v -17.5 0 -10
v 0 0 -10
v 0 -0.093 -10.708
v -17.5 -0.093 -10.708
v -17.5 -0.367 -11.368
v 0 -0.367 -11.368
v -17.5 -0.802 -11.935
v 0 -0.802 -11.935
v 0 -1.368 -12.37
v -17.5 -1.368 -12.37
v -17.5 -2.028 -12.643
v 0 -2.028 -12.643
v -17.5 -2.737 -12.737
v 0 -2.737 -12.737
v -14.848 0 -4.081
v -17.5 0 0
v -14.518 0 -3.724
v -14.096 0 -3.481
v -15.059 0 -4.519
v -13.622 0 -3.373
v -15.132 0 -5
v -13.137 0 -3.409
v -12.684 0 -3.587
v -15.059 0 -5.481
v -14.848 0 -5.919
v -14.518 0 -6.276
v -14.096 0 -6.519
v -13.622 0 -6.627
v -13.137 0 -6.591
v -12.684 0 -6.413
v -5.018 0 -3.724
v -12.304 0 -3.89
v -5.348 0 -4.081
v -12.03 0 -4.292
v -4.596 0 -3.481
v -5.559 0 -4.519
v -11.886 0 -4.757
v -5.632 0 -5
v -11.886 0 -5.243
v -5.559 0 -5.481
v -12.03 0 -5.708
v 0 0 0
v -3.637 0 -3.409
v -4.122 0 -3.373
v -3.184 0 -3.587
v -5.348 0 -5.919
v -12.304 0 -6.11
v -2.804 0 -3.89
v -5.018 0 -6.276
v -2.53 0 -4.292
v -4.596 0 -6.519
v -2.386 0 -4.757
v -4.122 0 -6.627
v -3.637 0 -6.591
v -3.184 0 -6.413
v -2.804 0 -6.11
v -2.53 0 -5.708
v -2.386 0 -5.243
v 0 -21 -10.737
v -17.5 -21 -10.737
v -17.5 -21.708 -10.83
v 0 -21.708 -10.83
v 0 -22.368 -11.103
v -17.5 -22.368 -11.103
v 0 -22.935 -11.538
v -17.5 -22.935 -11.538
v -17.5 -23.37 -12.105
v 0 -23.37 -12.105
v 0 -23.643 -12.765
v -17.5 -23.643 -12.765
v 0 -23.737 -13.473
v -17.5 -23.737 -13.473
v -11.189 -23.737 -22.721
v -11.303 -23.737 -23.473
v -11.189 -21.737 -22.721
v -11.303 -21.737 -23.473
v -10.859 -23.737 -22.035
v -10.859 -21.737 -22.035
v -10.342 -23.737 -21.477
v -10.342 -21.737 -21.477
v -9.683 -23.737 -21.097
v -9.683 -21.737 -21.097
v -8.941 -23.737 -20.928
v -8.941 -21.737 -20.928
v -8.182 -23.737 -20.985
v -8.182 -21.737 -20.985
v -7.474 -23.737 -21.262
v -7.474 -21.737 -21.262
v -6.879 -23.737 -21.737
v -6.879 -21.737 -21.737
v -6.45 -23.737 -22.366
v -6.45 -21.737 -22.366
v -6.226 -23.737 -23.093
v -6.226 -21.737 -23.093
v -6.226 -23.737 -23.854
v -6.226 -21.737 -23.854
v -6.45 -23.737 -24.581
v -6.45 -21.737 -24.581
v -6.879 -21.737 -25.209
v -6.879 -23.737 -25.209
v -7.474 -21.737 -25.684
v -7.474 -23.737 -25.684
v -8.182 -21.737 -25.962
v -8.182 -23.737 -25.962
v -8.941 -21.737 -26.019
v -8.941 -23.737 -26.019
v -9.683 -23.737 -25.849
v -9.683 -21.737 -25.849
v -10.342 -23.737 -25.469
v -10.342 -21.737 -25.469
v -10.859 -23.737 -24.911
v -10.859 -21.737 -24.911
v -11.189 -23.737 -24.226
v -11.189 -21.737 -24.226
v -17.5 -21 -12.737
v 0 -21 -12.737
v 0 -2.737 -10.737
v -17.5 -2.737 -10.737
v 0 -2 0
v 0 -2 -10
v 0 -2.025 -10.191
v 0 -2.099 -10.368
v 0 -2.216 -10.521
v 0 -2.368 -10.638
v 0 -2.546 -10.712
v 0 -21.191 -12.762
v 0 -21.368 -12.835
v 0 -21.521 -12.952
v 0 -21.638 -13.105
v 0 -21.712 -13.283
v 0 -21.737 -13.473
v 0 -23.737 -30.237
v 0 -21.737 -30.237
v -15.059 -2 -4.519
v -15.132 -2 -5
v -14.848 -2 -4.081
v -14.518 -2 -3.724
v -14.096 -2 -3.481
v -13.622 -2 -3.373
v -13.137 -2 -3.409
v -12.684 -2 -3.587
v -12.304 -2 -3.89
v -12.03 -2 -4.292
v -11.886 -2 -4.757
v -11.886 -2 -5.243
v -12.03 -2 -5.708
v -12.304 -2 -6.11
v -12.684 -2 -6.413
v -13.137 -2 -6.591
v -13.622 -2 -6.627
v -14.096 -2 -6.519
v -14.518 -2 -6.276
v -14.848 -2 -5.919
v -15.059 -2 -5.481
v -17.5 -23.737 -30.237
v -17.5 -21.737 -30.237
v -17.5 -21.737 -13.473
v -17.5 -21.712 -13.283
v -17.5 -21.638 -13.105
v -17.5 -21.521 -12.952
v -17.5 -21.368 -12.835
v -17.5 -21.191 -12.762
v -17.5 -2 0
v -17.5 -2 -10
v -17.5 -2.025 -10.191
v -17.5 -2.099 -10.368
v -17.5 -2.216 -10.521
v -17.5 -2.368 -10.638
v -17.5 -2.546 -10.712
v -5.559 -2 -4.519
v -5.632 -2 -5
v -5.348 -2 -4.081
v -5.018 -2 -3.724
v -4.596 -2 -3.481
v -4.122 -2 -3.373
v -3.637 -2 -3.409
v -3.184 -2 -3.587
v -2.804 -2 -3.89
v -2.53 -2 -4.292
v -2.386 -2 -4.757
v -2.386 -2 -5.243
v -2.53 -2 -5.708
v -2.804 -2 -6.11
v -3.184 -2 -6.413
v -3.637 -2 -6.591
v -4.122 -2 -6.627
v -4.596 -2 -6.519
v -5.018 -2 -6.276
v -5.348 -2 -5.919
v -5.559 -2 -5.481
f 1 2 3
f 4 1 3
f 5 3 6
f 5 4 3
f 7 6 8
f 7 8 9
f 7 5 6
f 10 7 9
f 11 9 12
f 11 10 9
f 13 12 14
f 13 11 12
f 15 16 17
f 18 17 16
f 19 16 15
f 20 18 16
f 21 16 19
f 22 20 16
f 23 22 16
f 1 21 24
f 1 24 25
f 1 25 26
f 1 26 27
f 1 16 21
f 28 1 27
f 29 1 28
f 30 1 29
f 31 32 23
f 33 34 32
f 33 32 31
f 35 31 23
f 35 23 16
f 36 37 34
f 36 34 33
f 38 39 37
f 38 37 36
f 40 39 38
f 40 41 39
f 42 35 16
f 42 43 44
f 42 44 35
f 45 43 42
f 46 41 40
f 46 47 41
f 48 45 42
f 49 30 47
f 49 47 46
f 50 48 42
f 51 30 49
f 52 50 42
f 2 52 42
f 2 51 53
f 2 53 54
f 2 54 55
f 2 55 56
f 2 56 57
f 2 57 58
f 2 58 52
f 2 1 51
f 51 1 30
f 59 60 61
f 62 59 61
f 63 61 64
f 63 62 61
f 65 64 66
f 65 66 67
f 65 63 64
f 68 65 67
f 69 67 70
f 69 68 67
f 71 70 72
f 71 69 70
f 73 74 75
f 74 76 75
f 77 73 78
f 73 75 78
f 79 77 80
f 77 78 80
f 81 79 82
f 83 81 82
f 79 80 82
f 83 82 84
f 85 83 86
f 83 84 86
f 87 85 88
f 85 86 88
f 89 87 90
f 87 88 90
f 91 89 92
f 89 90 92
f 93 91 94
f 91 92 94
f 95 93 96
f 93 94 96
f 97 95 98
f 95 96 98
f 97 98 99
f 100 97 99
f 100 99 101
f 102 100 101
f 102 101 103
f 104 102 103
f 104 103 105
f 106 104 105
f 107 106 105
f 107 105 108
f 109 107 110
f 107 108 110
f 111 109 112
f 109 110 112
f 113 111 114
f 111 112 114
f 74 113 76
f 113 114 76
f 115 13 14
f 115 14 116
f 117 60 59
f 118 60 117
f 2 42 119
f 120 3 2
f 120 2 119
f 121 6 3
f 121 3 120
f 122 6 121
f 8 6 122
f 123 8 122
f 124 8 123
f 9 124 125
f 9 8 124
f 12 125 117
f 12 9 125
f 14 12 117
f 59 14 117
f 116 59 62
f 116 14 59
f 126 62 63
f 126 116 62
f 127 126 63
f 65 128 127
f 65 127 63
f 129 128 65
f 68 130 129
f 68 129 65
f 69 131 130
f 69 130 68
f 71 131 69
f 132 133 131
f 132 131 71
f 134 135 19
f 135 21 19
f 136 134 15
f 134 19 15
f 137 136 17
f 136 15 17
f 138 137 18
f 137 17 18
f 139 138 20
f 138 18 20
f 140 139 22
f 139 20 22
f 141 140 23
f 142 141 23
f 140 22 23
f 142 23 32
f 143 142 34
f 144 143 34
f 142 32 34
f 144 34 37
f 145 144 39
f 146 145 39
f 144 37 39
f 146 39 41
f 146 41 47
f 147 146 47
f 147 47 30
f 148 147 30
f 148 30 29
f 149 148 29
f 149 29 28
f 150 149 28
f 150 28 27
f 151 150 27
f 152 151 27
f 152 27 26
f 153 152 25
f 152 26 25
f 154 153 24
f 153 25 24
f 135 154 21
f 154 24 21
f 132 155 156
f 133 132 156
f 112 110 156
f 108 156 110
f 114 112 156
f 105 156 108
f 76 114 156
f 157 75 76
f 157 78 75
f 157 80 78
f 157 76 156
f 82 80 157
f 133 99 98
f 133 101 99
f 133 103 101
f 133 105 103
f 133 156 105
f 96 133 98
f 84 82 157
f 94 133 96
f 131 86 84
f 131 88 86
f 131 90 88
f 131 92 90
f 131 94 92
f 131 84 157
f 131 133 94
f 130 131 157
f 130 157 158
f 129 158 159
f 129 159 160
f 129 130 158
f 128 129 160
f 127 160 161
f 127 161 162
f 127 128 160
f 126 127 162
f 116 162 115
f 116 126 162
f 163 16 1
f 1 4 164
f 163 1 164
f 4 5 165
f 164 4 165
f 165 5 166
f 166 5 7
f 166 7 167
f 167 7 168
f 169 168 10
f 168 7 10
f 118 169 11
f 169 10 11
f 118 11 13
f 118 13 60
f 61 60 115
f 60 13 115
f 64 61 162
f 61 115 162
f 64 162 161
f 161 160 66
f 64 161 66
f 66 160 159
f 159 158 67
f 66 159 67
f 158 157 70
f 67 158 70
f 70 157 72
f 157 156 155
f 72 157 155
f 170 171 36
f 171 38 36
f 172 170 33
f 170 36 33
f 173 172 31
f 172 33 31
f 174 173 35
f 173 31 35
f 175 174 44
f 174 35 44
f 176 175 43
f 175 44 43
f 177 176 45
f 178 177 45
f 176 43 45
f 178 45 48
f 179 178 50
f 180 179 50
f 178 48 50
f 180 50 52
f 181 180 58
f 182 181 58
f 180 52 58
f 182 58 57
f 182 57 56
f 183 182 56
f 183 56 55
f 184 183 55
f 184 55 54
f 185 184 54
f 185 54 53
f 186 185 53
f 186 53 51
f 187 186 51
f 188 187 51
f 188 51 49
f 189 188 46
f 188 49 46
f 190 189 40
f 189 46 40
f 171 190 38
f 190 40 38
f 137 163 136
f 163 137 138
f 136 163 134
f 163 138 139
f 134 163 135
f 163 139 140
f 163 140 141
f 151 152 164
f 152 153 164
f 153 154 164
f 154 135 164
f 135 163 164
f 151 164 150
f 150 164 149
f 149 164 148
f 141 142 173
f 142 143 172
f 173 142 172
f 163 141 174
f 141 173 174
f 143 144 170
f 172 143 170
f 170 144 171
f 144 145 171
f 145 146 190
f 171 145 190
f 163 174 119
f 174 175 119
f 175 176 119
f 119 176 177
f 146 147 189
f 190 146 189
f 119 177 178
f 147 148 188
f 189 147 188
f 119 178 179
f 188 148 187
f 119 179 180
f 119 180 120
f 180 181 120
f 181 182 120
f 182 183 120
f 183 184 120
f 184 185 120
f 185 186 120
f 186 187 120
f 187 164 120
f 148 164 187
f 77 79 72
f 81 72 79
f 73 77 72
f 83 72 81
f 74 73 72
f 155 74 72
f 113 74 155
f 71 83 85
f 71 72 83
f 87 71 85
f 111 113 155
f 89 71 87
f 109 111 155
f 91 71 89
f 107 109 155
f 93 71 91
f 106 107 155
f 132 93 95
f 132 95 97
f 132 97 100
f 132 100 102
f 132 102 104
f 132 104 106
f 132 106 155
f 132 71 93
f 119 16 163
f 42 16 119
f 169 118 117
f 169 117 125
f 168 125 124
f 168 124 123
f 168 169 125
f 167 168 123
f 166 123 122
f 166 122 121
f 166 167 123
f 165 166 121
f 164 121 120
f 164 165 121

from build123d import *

# Parameters (mm, degrees)
SKETCH1_W                  = 17.5
SKETCH1_H                  = 10
BASE_FLANGE1_DEPTH         = 2
F_4_CLEARANCE_HOLE1_D      = 3.2639
F_4_CLEARANCE_HOLE1_DEPTH  = 2
F_4_CLEARANCE_HOLE1_TIP    = 0.980574487
EDGE_FLANGE1_DEPTH         = 17.5
EDGE_FLANGE2_DEPTH         = 17.5
F_10_CLEARANCE_HOLE1_D     = 5.1054
F_10_CLEARANCE_HOLE1_DEPTH = 2
F_10_CLEARANCE_HOLE1_TIP   = 1.533816902


# Sheet-metal steps are written as plain solids
with BuildPart() as part:
    # Sketch1 → Base-Flange1 (new body)
    with BuildSketch(Plane(origin=(0, 0, 0), x_dir=(1, 0, 0), z_dir=(0, 1, 0))):
        with Locations((-8.75, 5)):
            Rectangle(SKETCH1_W, SKETCH1_H)
    extrude(amount=-BASE_FLANGE1_DEPTH)

    # #4 Clearance Hole1
    with Locations(Plane.XZ.offset(2)):
        with Locations((-4, -5), (-13.5, -5)):
            Hole(F_4_CLEARANCE_HOLE1_D / 2, depth=F_4_CLEARANCE_HOLE1_DEPTH)
            with Locations((0, 0, -(F_4_CLEARANCE_HOLE1_DEPTH + F_4_CLEARANCE_HOLE1_TIP / 2))):  # 118° drill point
                Cone(0, F_4_CLEARANCE_HOLE1_D / 2, F_4_CLEARANCE_HOLE1_TIP, mode=Mode.SUBTRACT)

    # Edge-Flange1 section (across the edge) → Edge-Flange1 (add)
    with BuildSketch(Plane(origin=(-17.5, -2, -10.7366), x_dir=(0, 0, 1), z_dir=(1, 0, 0))):
        with BuildLine():
            Line((-2, 0.7366), (-2, 19))
            Line((-2, 19), (0, 19))
            Line((0, 19), (0, 0.7366))
            ThreePointArc((0, 0.7366), (0.215745145, 0.215745145), (0.7366, 0))
            Line((0.7366, 0), (0.7366, -2))
            ThreePointArc((0.7366, -2), (-1.198468417, -1.198468417), (-2, 0.7366))
        make_face()
    extrude(amount=EDGE_FLANGE1_DEPTH)

    # Edge-Flange2 section (across the edge) → Edge-Flange2 (add)
    with BuildSketch(Plane(origin=(0, -21.7366, -12.7366), x_dir=(0, 1, 0), z_dir=(-1, 0, 0))):
        with BuildLine():
            Line((-2, 0.7366), (-2, 17.5))
            Line((-2, 17.5), (0, 17.5))
            Line((0, 17.5), (0, 0.7366))
            ThreePointArc((0, 0.7366), (0.215745145, 0.215745145), (0.7366, 0))
            Line((0.7366, 0), (0.7366, -2))
            ThreePointArc((0.7366, -2), (-1.198468417, -1.198468417), (-2, 0.7366))
        make_face()
    extrude(amount=EDGE_FLANGE2_DEPTH)

    # #10 Clearance Hole1
    with Locations(Plane.XZ.offset(23.7366)):
        with Locations((-8.75, -23.4732)):
            Hole(F_10_CLEARANCE_HOLE1_D / 2, depth=F_10_CLEARANCE_HOLE1_DEPTH)
            with Locations((0, 0, -(F_10_CLEARANCE_HOLE1_DEPTH + F_10_CLEARANCE_HOLE1_TIP / 2))):  # 118° drill point
                Cone(0, F_10_CLEARANCE_HOLE1_D / 2, F_10_CLEARANCE_HOLE1_TIP, mode=Mode.SUBTRACT)


solid = part.part
